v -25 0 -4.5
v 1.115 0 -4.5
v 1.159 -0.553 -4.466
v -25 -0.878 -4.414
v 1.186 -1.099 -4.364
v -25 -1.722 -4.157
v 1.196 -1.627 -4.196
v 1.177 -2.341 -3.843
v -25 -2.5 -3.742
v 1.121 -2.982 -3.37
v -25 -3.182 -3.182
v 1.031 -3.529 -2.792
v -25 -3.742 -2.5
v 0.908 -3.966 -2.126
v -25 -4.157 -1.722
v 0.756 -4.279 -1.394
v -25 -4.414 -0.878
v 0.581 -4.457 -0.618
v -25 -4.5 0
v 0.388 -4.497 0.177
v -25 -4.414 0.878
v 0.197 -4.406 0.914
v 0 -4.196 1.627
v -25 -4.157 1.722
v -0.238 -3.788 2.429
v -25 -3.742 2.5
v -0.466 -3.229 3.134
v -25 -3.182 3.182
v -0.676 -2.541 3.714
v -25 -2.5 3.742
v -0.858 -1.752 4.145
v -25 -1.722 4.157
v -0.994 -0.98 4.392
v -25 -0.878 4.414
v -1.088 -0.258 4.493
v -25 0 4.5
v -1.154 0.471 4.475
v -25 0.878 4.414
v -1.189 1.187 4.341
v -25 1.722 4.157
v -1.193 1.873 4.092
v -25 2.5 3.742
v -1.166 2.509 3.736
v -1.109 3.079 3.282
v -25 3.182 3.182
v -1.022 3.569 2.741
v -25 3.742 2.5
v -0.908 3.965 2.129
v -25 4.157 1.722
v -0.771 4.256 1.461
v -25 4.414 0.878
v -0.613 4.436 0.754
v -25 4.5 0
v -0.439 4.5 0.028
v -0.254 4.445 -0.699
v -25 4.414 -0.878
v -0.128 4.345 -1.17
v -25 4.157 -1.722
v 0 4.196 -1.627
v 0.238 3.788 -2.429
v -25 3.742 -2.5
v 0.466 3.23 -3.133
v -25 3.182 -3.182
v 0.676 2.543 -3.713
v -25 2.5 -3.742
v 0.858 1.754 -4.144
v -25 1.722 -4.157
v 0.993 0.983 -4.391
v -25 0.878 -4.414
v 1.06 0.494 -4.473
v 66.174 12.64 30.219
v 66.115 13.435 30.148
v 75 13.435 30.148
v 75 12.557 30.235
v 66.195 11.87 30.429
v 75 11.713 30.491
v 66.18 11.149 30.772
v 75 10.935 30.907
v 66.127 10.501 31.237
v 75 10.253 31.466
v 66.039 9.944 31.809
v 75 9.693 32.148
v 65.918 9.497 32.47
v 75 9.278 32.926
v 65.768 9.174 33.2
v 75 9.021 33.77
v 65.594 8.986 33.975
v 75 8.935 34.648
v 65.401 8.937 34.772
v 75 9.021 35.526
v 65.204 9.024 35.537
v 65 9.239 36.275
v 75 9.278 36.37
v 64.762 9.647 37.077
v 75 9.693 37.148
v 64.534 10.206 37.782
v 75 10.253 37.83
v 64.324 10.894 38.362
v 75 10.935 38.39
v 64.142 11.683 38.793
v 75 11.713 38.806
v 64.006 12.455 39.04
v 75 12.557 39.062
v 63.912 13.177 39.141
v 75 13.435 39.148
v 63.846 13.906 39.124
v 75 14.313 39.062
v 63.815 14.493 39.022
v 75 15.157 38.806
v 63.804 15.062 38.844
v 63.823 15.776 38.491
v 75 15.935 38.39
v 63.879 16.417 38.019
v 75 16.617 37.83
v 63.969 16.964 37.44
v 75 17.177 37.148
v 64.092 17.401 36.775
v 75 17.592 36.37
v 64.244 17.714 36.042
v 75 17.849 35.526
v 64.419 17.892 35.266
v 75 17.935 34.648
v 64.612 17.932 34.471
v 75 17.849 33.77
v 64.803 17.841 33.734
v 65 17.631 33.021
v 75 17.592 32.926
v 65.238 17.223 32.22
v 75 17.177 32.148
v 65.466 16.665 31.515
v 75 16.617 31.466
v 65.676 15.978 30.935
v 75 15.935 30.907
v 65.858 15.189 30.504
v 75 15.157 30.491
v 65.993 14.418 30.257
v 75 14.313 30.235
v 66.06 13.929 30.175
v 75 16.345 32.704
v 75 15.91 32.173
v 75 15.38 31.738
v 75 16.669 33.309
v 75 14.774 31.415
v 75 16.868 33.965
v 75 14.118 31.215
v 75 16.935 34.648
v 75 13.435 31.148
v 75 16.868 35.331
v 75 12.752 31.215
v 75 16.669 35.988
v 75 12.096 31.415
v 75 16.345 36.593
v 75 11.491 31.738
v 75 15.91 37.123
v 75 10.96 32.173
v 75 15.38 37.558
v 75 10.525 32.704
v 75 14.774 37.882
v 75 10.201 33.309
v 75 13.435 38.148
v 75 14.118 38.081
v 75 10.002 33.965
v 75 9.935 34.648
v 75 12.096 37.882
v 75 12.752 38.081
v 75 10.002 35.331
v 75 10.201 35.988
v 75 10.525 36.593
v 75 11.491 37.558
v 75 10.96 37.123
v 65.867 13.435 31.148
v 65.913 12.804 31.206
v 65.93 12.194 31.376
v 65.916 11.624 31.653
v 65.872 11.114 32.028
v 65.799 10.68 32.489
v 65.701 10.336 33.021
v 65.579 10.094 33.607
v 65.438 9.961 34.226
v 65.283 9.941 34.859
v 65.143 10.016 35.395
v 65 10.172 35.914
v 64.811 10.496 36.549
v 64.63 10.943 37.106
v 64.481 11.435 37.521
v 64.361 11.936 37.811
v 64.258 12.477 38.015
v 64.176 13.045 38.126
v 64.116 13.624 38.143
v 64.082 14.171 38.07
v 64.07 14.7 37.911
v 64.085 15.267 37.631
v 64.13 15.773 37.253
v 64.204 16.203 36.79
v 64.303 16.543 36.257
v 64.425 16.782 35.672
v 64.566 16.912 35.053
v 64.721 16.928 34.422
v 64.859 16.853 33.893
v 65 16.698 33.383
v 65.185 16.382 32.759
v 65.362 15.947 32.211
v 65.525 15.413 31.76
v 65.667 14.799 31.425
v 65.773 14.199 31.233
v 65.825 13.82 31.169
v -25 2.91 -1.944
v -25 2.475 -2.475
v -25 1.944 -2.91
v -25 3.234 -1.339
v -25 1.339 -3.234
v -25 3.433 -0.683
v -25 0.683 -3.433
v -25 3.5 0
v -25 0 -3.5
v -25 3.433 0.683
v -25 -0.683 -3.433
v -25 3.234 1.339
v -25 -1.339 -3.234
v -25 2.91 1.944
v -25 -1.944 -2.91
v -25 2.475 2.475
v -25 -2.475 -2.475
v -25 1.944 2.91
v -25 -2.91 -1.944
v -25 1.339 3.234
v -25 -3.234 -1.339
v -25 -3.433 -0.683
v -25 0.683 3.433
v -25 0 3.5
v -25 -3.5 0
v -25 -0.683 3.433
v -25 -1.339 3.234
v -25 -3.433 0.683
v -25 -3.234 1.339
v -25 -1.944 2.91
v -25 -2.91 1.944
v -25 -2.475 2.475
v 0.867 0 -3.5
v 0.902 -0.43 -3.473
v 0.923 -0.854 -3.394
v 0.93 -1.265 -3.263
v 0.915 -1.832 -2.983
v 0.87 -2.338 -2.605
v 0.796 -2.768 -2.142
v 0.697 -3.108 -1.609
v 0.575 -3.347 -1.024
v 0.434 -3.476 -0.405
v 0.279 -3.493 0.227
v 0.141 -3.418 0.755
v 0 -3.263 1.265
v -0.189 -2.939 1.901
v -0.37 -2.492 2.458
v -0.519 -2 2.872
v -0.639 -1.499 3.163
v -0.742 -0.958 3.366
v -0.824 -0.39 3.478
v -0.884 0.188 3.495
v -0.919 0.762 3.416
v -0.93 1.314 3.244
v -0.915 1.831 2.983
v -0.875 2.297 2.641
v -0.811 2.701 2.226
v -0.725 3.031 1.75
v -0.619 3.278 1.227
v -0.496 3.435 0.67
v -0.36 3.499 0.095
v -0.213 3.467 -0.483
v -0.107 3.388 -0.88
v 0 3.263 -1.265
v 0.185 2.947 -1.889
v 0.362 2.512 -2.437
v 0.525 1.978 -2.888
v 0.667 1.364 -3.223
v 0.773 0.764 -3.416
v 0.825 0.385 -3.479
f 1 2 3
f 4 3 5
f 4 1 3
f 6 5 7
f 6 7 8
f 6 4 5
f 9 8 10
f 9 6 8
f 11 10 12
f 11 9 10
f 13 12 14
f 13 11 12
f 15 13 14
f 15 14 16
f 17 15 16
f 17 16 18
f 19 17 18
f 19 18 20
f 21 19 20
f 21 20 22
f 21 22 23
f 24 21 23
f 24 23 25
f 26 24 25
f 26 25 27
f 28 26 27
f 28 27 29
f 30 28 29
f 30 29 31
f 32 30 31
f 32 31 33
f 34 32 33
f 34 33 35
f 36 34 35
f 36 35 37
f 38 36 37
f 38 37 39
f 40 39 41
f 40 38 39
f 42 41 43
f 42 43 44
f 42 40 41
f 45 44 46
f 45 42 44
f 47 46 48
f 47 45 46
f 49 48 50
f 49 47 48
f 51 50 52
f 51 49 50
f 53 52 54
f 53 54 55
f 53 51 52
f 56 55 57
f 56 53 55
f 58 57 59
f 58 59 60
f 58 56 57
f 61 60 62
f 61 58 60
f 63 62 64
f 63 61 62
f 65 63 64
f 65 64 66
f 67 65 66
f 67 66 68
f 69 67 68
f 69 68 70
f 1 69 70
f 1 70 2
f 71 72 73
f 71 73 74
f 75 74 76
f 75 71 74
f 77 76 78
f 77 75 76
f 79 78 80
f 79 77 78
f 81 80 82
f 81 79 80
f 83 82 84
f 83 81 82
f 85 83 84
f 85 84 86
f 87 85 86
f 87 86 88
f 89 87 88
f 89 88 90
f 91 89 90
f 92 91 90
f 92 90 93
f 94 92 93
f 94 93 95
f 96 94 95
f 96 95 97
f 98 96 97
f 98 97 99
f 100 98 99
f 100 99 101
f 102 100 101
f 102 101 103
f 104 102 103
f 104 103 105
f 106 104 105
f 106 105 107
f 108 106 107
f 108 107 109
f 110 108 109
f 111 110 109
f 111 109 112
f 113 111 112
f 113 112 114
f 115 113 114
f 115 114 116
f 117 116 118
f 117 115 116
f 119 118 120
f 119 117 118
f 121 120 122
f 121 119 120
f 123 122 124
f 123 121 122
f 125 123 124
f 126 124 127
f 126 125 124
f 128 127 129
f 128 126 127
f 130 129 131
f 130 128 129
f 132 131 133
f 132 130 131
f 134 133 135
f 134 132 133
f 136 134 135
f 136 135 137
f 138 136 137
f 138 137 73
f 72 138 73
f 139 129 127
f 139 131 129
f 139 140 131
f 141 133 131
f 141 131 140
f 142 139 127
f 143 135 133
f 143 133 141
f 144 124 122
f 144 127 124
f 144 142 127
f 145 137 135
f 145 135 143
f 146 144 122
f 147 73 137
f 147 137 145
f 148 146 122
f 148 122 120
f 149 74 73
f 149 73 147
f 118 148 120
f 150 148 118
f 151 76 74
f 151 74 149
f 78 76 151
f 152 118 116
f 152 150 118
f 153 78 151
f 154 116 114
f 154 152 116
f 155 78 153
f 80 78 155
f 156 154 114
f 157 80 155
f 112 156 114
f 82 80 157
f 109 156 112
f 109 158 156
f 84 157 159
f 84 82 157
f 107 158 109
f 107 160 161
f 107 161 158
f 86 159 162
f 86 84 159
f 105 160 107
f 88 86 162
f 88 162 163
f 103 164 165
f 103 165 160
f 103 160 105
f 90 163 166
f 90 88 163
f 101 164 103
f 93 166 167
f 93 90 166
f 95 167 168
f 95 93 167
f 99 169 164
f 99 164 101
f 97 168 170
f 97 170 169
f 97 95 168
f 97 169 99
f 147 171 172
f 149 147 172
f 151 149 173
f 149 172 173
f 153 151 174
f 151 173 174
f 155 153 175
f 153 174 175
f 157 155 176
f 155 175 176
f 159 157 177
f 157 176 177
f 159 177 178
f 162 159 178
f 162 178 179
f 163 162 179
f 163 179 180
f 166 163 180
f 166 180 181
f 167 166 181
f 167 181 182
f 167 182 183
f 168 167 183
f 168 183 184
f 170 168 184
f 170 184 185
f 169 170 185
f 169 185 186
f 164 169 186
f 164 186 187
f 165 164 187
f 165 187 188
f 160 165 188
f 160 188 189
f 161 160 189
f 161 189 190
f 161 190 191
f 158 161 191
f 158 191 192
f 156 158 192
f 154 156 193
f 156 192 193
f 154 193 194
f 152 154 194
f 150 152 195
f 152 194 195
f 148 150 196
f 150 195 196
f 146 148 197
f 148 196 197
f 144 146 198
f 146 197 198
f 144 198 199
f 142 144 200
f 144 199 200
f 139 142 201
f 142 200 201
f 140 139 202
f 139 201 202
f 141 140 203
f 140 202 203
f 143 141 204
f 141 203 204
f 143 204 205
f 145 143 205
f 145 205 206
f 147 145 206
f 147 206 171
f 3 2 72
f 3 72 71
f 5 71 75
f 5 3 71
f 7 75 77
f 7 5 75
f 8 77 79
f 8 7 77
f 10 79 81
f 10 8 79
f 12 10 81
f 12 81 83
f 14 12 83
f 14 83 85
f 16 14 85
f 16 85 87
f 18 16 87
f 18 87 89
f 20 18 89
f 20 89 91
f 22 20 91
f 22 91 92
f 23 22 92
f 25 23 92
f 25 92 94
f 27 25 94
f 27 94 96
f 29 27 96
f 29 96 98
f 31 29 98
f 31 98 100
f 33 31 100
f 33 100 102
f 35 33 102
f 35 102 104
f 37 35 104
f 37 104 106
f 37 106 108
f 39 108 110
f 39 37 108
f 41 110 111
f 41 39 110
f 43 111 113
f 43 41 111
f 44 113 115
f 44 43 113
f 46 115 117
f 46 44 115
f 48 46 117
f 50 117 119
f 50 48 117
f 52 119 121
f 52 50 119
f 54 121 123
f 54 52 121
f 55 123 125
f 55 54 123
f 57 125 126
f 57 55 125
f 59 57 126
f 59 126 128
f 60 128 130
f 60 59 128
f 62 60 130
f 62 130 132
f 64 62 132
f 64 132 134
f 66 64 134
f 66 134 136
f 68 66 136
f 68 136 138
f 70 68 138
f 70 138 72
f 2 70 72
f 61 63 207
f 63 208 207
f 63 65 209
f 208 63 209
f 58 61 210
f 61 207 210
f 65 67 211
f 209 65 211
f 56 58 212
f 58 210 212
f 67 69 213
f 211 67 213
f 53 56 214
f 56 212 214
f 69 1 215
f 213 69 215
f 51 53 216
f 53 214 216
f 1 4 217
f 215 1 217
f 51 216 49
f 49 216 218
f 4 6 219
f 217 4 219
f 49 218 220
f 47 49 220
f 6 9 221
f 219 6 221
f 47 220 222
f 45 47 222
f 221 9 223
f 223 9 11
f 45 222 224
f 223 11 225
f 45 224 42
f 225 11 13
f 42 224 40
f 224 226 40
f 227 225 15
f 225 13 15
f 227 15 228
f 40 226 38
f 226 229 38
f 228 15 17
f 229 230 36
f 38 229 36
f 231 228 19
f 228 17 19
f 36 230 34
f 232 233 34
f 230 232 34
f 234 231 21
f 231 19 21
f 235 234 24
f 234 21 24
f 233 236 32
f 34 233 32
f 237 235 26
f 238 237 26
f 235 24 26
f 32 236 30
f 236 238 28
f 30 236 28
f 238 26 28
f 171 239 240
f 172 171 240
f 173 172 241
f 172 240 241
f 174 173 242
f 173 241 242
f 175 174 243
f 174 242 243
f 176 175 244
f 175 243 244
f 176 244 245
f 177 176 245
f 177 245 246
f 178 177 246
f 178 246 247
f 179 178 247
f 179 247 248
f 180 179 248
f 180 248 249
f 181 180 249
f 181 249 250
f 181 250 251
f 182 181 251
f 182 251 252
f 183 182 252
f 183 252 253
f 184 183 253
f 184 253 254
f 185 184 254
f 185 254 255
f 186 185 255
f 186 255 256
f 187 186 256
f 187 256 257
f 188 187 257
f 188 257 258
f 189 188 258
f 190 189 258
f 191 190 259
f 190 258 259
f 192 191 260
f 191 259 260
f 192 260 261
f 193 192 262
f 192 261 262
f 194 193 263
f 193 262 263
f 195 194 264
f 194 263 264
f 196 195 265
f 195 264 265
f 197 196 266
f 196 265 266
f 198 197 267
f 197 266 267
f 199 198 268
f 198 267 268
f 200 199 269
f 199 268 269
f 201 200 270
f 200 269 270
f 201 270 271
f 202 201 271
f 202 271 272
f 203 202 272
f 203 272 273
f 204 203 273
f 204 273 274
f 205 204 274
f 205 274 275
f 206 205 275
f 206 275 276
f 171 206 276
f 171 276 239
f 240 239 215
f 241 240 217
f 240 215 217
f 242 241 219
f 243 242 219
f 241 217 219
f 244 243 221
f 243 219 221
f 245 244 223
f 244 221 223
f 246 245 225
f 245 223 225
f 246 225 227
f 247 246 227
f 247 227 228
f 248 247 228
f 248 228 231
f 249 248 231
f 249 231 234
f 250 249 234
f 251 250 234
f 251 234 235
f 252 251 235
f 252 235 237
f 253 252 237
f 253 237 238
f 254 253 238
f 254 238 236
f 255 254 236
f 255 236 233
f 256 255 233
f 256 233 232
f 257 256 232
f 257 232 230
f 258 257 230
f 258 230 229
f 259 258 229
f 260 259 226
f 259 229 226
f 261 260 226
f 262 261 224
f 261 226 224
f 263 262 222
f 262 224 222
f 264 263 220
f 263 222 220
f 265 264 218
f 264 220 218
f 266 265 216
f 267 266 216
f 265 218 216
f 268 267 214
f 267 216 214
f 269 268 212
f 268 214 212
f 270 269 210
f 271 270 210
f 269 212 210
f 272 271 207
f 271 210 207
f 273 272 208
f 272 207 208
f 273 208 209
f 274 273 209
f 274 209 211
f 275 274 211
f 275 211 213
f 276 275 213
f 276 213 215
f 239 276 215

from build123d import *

# Parameters (mm, degrees)
SKETCH2_R   = 4.5
SKETCH2_R_2 = 3.5


with BuildPart() as part:
    # Sweep1: sweep along a curve in space
    with BuildLine() as sweep1_path:
        Line((0, 0, 0), (-25, 0, 0))
        Line((0, 0, 0), (65, 13.43503, 34.64823))
        Line((65, 13.43503, 34.64823), (75, 13.43503, 34.64823))
    # Sketch2 → Sweep1 (sweep)
    with BuildSketch(Plane(origin=(0, 0, 0), x_dir=(0, 0, -1), z_dir=(1, 0, 0))):
        Circle(SKETCH2_R)
        Circle(SKETCH2_R_2, mode=Mode.SUBTRACT)
    sweep(path=sweep1_path.line, transition=Transition.RIGHT)


solid = part.part
